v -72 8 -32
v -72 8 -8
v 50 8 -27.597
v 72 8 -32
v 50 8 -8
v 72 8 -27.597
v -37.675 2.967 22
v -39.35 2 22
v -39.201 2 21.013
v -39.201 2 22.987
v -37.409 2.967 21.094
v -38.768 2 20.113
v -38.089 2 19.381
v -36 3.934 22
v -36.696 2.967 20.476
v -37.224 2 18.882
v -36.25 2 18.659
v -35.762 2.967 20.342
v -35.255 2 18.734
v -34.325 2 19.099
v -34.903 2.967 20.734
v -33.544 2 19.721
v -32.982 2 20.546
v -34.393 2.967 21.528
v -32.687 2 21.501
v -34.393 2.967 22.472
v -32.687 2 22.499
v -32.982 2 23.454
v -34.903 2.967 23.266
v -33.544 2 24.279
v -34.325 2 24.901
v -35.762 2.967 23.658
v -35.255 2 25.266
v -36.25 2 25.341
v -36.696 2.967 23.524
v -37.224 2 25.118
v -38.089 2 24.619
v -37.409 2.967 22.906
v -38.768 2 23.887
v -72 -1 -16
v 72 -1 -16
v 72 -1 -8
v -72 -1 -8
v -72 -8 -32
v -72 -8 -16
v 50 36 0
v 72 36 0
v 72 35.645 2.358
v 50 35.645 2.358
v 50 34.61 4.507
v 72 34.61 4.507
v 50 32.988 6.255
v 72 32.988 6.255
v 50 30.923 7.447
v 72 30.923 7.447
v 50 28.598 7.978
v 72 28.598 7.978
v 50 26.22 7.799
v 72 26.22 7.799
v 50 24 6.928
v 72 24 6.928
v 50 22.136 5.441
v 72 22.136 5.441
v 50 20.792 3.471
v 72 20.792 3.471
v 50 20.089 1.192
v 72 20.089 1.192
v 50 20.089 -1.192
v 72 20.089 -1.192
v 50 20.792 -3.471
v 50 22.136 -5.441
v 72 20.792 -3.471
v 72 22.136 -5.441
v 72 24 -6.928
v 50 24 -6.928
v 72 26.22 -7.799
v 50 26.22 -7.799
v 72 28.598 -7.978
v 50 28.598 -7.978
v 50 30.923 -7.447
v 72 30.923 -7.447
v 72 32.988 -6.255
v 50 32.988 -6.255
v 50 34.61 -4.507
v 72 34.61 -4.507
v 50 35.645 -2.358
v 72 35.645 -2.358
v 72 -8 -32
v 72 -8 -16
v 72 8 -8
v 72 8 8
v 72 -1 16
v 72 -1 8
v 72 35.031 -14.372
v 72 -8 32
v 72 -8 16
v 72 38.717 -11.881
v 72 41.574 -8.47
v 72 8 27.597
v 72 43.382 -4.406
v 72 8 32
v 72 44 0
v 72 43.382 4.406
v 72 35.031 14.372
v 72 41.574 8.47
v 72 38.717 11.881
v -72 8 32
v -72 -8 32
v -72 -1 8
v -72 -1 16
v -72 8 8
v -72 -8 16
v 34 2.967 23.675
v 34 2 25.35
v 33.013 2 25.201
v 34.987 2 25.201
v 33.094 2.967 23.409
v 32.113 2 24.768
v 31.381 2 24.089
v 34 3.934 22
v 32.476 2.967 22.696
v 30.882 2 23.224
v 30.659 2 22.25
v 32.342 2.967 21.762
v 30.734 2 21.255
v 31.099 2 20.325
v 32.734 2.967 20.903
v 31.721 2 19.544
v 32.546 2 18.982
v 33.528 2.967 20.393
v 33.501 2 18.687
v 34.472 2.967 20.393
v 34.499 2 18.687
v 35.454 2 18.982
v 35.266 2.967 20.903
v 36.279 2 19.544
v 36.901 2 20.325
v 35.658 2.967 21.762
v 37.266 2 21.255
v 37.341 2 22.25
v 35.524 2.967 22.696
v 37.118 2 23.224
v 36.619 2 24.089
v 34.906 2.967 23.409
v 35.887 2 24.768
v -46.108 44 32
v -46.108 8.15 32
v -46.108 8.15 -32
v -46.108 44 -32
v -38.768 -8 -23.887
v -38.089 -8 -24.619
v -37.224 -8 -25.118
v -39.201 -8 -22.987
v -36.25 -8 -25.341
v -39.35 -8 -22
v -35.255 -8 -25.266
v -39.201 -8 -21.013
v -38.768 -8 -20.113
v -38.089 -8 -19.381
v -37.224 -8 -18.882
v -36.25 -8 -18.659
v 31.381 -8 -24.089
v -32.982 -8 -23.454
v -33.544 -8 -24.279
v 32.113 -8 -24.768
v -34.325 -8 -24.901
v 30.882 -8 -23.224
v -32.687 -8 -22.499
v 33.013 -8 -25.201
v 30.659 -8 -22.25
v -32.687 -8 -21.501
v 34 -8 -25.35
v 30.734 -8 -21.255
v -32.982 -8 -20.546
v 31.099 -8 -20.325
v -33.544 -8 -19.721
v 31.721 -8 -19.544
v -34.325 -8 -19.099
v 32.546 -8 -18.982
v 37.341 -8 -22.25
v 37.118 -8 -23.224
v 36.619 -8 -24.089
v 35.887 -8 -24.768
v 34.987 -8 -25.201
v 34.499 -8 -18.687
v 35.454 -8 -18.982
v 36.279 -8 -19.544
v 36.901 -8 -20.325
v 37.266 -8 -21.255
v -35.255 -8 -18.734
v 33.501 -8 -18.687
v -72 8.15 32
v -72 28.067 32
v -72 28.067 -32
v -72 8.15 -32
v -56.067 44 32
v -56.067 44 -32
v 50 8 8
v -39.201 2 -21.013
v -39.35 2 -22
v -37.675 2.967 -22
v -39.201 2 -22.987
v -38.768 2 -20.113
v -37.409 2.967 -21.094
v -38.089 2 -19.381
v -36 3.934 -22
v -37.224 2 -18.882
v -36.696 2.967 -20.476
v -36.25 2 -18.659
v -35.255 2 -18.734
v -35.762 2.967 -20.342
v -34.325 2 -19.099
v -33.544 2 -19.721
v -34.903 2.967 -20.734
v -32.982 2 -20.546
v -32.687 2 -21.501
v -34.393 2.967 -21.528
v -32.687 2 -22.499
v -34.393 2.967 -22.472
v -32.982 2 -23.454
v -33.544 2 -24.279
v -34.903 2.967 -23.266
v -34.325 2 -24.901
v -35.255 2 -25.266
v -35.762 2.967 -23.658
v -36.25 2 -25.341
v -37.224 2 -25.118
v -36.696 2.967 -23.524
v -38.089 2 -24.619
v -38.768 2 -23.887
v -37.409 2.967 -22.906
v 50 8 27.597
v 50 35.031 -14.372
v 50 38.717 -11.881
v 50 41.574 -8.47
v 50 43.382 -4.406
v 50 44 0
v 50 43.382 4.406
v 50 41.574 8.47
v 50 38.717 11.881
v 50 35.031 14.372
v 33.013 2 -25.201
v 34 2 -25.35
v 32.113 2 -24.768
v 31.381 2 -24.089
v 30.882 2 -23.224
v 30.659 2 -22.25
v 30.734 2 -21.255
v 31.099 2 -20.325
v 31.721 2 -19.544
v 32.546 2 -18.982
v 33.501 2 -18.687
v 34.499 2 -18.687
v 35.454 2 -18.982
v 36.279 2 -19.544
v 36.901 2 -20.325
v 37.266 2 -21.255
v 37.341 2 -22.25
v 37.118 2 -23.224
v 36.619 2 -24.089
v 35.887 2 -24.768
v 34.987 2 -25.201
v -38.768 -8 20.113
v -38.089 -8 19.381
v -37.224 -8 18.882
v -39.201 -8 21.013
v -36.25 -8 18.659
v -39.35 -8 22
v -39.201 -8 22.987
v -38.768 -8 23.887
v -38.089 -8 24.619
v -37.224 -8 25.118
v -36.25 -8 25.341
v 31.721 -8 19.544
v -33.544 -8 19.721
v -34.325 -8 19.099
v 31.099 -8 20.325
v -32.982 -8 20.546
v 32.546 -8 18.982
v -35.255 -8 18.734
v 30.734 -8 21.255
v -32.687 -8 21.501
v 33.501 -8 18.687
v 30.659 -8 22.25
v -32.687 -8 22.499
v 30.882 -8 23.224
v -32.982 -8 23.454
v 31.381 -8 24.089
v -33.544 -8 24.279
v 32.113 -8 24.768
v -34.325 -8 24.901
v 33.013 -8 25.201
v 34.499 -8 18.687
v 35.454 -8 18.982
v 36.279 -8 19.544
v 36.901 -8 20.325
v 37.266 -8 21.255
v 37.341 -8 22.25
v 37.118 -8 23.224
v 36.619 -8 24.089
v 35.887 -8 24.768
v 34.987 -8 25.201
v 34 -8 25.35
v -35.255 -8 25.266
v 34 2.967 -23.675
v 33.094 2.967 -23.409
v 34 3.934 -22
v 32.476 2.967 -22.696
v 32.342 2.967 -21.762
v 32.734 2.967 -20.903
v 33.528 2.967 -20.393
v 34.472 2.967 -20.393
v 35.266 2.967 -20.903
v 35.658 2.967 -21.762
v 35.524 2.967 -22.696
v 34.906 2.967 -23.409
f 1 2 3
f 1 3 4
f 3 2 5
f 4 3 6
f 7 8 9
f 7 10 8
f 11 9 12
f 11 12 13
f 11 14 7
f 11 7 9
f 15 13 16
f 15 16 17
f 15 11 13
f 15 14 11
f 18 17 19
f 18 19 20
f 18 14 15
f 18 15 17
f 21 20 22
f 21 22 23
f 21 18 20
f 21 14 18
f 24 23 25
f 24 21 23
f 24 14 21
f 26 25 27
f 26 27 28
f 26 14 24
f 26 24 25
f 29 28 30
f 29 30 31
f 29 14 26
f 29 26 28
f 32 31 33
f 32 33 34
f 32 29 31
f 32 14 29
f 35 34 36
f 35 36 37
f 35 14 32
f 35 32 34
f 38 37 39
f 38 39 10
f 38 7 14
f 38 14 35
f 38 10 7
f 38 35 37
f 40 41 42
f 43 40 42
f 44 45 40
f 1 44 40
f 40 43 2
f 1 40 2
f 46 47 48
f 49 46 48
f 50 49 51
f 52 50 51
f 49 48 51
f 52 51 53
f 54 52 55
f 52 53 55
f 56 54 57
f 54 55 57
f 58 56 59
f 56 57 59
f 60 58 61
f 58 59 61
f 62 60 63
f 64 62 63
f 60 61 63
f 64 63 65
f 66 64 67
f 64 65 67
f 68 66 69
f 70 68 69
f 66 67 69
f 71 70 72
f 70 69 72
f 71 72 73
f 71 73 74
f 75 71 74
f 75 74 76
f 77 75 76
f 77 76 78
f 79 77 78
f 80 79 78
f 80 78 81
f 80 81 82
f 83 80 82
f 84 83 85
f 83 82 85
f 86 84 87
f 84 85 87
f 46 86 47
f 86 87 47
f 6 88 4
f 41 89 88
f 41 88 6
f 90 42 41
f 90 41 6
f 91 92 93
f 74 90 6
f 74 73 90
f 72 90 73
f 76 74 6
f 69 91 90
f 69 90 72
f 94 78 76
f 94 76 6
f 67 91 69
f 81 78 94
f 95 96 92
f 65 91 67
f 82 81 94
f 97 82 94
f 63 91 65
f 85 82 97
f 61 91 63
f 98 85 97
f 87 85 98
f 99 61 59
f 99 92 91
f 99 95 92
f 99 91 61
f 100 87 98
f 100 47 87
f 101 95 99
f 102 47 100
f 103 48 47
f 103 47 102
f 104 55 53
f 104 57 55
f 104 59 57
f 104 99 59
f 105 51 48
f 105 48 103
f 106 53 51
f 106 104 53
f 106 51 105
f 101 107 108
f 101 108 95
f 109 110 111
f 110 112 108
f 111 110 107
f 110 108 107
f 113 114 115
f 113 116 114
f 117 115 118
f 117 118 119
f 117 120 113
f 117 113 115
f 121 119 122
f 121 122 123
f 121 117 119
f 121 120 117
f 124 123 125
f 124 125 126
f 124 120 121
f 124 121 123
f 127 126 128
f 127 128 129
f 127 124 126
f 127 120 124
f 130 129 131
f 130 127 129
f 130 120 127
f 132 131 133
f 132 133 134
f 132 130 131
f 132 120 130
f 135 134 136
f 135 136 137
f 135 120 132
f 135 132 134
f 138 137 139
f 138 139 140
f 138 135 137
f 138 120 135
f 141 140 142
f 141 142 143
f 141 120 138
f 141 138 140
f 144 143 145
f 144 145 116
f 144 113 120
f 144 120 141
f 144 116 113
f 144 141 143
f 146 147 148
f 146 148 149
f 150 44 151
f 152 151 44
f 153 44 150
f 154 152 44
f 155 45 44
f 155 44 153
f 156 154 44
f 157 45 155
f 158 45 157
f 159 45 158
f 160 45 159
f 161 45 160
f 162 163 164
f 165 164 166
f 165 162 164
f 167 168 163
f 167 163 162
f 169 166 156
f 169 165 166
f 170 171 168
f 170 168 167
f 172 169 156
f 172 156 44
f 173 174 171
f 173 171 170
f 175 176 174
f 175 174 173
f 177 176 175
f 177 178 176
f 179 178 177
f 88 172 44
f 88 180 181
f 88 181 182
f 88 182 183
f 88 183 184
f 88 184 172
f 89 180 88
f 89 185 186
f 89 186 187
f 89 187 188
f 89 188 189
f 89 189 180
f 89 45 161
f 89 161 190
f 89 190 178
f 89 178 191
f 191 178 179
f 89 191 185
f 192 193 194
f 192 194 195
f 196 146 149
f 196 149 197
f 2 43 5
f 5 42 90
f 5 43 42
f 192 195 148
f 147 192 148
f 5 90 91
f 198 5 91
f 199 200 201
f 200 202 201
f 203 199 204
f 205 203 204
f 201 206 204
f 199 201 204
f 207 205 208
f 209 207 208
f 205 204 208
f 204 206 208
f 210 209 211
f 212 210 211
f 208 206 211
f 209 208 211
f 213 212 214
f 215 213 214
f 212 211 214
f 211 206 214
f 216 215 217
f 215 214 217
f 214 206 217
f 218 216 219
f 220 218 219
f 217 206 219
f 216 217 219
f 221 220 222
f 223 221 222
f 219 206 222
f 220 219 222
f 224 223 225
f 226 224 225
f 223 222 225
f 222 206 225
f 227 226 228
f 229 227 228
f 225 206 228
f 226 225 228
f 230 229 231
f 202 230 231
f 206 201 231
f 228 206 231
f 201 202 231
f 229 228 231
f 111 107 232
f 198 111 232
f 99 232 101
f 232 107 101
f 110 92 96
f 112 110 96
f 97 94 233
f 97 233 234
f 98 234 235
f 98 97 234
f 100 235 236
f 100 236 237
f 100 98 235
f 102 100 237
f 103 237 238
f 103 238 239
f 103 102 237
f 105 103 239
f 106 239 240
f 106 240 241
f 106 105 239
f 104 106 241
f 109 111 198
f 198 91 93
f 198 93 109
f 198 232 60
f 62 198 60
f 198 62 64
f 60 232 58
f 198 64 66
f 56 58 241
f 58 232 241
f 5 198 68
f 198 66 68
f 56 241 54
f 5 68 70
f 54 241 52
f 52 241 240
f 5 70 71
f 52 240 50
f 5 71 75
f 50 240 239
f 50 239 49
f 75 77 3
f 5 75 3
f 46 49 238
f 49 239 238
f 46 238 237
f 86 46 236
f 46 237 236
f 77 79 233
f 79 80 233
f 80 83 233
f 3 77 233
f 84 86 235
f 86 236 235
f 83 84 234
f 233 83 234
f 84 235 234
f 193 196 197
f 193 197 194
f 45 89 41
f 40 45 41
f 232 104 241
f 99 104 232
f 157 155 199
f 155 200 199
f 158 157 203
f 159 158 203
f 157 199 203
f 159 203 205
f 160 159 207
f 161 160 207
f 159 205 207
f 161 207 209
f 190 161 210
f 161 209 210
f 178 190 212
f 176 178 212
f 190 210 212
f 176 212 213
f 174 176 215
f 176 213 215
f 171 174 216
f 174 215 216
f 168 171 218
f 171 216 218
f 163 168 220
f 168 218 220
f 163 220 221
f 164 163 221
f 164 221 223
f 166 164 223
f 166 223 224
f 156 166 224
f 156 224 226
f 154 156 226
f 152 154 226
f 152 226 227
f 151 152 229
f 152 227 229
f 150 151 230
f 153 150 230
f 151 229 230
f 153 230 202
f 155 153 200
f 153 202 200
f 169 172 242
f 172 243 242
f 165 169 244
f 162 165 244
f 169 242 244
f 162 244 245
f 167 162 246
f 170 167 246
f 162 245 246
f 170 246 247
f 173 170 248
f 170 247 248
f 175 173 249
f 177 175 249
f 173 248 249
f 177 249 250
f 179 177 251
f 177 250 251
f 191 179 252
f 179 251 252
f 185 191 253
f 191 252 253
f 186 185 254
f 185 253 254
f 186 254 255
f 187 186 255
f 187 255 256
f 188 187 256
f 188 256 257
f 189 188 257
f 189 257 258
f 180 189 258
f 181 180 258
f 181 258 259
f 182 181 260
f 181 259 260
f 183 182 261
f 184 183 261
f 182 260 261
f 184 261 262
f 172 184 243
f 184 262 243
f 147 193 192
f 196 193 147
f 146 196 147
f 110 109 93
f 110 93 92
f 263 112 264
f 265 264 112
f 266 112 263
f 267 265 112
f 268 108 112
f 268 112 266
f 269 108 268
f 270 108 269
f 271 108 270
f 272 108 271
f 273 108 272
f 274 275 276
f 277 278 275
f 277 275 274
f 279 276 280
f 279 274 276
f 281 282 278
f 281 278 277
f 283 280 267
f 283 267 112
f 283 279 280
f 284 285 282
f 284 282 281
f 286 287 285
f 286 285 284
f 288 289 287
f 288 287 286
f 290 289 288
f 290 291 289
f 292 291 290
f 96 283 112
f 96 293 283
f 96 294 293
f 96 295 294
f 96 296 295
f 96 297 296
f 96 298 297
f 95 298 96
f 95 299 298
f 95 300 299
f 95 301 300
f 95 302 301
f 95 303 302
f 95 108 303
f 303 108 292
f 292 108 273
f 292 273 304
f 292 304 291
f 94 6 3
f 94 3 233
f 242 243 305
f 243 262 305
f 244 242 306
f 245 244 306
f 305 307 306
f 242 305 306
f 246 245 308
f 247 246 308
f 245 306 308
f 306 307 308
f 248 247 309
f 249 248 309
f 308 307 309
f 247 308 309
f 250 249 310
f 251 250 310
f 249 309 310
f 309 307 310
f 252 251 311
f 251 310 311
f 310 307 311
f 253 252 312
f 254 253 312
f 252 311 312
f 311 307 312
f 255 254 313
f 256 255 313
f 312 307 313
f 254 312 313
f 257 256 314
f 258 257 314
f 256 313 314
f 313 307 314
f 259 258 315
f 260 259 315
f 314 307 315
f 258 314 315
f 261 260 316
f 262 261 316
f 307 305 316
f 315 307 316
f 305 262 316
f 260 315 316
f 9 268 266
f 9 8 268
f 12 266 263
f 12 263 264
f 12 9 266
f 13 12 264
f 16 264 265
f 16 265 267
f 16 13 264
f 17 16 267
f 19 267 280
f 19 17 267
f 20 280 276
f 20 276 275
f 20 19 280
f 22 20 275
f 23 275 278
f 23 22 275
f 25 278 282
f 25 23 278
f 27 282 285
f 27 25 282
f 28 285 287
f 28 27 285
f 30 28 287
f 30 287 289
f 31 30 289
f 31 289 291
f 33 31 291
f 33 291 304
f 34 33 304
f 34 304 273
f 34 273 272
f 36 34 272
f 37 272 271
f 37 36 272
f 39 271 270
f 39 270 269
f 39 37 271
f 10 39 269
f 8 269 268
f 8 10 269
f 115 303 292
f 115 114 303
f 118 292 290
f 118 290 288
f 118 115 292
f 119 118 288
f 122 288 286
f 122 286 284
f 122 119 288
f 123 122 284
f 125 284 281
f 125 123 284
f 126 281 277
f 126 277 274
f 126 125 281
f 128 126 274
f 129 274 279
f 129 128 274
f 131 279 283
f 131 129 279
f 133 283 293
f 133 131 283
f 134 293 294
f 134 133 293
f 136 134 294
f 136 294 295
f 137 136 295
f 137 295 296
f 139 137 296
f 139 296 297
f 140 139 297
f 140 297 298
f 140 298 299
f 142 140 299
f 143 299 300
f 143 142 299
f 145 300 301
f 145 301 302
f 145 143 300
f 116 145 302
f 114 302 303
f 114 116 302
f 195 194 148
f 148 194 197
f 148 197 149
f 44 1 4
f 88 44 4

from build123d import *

# Parameters (mm, degrees)
SKETCH1_W           = 144
SKETCH1_H           = 16
BOSS_EXTRUDE1_DEPTH = 32
BOSS_EXTRUDE2_DEPTH = 64
SKETCH3_R           = 8
BOSS_EXTRUDE3_DEPTH = 22
CUT_EXTRUDE1_DEPTH  = 154.935051239


with BuildPart() as part:
    # Sketch1 → Boss-Extrude1 (new, symmetric)
    with BuildSketch(Plane.XY):
        Rectangle(SKETCH1_W, SKETCH1_H)
    extrude(amount=BOSS_EXTRUDE1_DEPTH, both=True)

    # Sketch3 → Boss-Extrude3 (add)
    with BuildSketch(Plane(origin=(72, 0, 0), x_dir=(0, 0, -1), z_dir=(1, 0, 0))):
        with BuildLine():
            Line((-27.596884244, 8), (-32, 8))
            Line((-32, 8), (-32, -8))
            Line((-32, -8), (32, -8))
            Line((32, -8), (32, 8))
            Line((32, 8), (27.596884244, 8))
            Line((27.596884244, 8), (14.372185951, 35.031377602))
            ThreePointArc((14.372185951, 35.031377602), (0, 44), (-14.372185951, 35.031377602))
            Line((-14.372185951, 35.031377602), (-27.596884244, 8))
        make_face()
        with Locations(Location((0, 28, 0), (0, 0, 90))):
            Circle(SKETCH3_R, mode=Mode.SUBTRACT)
    extrude(amount=-BOSS_EXTRUDE3_DEPTH)

    # Sketch4 → Cut-Extrude1 (cut, through all)
    with BuildSketch(Plane(origin=(72, 0, 0), x_dir=(0, 0, -1), z_dir=(1, 0, 0))):
        Polygon((8, 8), (-8, 8), (-8, -1), (-16, -1), (-16, -8), (16, -8), (16, -1), (8, -1), align=None)
    extrude(amount=-CUT_EXTRUDE1_DEPTH, mode=Mode.SUBTRACT)

    # Sketch6 → Cut-Revolve1 (revolve, cut)
    with BuildSketch(Plane.XY.offset(22), mode=Mode.PRIVATE) as cut_revolve1_sk:
        Polygon((34, -2.139952418), (34, -8), (30.65, -8), (30.65, 2), (34, 3.934123402), align=None)
    cut_revolve1 = revolve(cut_revolve1_sk.sketch.rotate(Axis((34, 3.934123402, 22), (0, -1, 0)), 270), axis=Axis((34, 3.934123402, 22), (0, -1, 0)), mode=Mode.SUBTRACT)

    # Sketch7 → Cut-Revolve2 (revolve, cut)
    with BuildSketch(Plane.XY.offset(22), mode=Mode.PRIVATE) as cut_revolve2_sk:
        Polygon((-36, 3.934123402), (-36, -8), (-32.65, -8), (-32.65, 2), align=None)
    cut_revolve2 = revolve(cut_revolve2_sk.sketch.rotate(Axis((-36, 3.934123402, 22), (0, -1, 0)), 180), axis=Axis((-36, 3.934123402, 22), (0, -1, 0)), mode=Mode.SUBTRACT)

    # Mirror2: Cut-Revolve1, Cut-Revolve2 across plane
    add(cut_revolve1.mirror(Plane.XY), mode=Mode.SUBTRACT)
    add(cut_revolve2.mirror(Plane.XY), mode=Mode.SUBTRACT)


with BuildPart() as body_2:
    # Sketch2 → Boss-Extrude2 (new body)
    with BuildSketch(Plane.XY.offset(32)):
        Polygon((-72, 8.15004748), (-46.108367624, 8.15004748), (-46.108367624, 44), (-56.066687769, 44), (-72, 28.066687769), align=None)
    extrude(amount=-BOSS_EXTRUDE2_DEPTH)


solid = Compound([part.part, body_2.part])
